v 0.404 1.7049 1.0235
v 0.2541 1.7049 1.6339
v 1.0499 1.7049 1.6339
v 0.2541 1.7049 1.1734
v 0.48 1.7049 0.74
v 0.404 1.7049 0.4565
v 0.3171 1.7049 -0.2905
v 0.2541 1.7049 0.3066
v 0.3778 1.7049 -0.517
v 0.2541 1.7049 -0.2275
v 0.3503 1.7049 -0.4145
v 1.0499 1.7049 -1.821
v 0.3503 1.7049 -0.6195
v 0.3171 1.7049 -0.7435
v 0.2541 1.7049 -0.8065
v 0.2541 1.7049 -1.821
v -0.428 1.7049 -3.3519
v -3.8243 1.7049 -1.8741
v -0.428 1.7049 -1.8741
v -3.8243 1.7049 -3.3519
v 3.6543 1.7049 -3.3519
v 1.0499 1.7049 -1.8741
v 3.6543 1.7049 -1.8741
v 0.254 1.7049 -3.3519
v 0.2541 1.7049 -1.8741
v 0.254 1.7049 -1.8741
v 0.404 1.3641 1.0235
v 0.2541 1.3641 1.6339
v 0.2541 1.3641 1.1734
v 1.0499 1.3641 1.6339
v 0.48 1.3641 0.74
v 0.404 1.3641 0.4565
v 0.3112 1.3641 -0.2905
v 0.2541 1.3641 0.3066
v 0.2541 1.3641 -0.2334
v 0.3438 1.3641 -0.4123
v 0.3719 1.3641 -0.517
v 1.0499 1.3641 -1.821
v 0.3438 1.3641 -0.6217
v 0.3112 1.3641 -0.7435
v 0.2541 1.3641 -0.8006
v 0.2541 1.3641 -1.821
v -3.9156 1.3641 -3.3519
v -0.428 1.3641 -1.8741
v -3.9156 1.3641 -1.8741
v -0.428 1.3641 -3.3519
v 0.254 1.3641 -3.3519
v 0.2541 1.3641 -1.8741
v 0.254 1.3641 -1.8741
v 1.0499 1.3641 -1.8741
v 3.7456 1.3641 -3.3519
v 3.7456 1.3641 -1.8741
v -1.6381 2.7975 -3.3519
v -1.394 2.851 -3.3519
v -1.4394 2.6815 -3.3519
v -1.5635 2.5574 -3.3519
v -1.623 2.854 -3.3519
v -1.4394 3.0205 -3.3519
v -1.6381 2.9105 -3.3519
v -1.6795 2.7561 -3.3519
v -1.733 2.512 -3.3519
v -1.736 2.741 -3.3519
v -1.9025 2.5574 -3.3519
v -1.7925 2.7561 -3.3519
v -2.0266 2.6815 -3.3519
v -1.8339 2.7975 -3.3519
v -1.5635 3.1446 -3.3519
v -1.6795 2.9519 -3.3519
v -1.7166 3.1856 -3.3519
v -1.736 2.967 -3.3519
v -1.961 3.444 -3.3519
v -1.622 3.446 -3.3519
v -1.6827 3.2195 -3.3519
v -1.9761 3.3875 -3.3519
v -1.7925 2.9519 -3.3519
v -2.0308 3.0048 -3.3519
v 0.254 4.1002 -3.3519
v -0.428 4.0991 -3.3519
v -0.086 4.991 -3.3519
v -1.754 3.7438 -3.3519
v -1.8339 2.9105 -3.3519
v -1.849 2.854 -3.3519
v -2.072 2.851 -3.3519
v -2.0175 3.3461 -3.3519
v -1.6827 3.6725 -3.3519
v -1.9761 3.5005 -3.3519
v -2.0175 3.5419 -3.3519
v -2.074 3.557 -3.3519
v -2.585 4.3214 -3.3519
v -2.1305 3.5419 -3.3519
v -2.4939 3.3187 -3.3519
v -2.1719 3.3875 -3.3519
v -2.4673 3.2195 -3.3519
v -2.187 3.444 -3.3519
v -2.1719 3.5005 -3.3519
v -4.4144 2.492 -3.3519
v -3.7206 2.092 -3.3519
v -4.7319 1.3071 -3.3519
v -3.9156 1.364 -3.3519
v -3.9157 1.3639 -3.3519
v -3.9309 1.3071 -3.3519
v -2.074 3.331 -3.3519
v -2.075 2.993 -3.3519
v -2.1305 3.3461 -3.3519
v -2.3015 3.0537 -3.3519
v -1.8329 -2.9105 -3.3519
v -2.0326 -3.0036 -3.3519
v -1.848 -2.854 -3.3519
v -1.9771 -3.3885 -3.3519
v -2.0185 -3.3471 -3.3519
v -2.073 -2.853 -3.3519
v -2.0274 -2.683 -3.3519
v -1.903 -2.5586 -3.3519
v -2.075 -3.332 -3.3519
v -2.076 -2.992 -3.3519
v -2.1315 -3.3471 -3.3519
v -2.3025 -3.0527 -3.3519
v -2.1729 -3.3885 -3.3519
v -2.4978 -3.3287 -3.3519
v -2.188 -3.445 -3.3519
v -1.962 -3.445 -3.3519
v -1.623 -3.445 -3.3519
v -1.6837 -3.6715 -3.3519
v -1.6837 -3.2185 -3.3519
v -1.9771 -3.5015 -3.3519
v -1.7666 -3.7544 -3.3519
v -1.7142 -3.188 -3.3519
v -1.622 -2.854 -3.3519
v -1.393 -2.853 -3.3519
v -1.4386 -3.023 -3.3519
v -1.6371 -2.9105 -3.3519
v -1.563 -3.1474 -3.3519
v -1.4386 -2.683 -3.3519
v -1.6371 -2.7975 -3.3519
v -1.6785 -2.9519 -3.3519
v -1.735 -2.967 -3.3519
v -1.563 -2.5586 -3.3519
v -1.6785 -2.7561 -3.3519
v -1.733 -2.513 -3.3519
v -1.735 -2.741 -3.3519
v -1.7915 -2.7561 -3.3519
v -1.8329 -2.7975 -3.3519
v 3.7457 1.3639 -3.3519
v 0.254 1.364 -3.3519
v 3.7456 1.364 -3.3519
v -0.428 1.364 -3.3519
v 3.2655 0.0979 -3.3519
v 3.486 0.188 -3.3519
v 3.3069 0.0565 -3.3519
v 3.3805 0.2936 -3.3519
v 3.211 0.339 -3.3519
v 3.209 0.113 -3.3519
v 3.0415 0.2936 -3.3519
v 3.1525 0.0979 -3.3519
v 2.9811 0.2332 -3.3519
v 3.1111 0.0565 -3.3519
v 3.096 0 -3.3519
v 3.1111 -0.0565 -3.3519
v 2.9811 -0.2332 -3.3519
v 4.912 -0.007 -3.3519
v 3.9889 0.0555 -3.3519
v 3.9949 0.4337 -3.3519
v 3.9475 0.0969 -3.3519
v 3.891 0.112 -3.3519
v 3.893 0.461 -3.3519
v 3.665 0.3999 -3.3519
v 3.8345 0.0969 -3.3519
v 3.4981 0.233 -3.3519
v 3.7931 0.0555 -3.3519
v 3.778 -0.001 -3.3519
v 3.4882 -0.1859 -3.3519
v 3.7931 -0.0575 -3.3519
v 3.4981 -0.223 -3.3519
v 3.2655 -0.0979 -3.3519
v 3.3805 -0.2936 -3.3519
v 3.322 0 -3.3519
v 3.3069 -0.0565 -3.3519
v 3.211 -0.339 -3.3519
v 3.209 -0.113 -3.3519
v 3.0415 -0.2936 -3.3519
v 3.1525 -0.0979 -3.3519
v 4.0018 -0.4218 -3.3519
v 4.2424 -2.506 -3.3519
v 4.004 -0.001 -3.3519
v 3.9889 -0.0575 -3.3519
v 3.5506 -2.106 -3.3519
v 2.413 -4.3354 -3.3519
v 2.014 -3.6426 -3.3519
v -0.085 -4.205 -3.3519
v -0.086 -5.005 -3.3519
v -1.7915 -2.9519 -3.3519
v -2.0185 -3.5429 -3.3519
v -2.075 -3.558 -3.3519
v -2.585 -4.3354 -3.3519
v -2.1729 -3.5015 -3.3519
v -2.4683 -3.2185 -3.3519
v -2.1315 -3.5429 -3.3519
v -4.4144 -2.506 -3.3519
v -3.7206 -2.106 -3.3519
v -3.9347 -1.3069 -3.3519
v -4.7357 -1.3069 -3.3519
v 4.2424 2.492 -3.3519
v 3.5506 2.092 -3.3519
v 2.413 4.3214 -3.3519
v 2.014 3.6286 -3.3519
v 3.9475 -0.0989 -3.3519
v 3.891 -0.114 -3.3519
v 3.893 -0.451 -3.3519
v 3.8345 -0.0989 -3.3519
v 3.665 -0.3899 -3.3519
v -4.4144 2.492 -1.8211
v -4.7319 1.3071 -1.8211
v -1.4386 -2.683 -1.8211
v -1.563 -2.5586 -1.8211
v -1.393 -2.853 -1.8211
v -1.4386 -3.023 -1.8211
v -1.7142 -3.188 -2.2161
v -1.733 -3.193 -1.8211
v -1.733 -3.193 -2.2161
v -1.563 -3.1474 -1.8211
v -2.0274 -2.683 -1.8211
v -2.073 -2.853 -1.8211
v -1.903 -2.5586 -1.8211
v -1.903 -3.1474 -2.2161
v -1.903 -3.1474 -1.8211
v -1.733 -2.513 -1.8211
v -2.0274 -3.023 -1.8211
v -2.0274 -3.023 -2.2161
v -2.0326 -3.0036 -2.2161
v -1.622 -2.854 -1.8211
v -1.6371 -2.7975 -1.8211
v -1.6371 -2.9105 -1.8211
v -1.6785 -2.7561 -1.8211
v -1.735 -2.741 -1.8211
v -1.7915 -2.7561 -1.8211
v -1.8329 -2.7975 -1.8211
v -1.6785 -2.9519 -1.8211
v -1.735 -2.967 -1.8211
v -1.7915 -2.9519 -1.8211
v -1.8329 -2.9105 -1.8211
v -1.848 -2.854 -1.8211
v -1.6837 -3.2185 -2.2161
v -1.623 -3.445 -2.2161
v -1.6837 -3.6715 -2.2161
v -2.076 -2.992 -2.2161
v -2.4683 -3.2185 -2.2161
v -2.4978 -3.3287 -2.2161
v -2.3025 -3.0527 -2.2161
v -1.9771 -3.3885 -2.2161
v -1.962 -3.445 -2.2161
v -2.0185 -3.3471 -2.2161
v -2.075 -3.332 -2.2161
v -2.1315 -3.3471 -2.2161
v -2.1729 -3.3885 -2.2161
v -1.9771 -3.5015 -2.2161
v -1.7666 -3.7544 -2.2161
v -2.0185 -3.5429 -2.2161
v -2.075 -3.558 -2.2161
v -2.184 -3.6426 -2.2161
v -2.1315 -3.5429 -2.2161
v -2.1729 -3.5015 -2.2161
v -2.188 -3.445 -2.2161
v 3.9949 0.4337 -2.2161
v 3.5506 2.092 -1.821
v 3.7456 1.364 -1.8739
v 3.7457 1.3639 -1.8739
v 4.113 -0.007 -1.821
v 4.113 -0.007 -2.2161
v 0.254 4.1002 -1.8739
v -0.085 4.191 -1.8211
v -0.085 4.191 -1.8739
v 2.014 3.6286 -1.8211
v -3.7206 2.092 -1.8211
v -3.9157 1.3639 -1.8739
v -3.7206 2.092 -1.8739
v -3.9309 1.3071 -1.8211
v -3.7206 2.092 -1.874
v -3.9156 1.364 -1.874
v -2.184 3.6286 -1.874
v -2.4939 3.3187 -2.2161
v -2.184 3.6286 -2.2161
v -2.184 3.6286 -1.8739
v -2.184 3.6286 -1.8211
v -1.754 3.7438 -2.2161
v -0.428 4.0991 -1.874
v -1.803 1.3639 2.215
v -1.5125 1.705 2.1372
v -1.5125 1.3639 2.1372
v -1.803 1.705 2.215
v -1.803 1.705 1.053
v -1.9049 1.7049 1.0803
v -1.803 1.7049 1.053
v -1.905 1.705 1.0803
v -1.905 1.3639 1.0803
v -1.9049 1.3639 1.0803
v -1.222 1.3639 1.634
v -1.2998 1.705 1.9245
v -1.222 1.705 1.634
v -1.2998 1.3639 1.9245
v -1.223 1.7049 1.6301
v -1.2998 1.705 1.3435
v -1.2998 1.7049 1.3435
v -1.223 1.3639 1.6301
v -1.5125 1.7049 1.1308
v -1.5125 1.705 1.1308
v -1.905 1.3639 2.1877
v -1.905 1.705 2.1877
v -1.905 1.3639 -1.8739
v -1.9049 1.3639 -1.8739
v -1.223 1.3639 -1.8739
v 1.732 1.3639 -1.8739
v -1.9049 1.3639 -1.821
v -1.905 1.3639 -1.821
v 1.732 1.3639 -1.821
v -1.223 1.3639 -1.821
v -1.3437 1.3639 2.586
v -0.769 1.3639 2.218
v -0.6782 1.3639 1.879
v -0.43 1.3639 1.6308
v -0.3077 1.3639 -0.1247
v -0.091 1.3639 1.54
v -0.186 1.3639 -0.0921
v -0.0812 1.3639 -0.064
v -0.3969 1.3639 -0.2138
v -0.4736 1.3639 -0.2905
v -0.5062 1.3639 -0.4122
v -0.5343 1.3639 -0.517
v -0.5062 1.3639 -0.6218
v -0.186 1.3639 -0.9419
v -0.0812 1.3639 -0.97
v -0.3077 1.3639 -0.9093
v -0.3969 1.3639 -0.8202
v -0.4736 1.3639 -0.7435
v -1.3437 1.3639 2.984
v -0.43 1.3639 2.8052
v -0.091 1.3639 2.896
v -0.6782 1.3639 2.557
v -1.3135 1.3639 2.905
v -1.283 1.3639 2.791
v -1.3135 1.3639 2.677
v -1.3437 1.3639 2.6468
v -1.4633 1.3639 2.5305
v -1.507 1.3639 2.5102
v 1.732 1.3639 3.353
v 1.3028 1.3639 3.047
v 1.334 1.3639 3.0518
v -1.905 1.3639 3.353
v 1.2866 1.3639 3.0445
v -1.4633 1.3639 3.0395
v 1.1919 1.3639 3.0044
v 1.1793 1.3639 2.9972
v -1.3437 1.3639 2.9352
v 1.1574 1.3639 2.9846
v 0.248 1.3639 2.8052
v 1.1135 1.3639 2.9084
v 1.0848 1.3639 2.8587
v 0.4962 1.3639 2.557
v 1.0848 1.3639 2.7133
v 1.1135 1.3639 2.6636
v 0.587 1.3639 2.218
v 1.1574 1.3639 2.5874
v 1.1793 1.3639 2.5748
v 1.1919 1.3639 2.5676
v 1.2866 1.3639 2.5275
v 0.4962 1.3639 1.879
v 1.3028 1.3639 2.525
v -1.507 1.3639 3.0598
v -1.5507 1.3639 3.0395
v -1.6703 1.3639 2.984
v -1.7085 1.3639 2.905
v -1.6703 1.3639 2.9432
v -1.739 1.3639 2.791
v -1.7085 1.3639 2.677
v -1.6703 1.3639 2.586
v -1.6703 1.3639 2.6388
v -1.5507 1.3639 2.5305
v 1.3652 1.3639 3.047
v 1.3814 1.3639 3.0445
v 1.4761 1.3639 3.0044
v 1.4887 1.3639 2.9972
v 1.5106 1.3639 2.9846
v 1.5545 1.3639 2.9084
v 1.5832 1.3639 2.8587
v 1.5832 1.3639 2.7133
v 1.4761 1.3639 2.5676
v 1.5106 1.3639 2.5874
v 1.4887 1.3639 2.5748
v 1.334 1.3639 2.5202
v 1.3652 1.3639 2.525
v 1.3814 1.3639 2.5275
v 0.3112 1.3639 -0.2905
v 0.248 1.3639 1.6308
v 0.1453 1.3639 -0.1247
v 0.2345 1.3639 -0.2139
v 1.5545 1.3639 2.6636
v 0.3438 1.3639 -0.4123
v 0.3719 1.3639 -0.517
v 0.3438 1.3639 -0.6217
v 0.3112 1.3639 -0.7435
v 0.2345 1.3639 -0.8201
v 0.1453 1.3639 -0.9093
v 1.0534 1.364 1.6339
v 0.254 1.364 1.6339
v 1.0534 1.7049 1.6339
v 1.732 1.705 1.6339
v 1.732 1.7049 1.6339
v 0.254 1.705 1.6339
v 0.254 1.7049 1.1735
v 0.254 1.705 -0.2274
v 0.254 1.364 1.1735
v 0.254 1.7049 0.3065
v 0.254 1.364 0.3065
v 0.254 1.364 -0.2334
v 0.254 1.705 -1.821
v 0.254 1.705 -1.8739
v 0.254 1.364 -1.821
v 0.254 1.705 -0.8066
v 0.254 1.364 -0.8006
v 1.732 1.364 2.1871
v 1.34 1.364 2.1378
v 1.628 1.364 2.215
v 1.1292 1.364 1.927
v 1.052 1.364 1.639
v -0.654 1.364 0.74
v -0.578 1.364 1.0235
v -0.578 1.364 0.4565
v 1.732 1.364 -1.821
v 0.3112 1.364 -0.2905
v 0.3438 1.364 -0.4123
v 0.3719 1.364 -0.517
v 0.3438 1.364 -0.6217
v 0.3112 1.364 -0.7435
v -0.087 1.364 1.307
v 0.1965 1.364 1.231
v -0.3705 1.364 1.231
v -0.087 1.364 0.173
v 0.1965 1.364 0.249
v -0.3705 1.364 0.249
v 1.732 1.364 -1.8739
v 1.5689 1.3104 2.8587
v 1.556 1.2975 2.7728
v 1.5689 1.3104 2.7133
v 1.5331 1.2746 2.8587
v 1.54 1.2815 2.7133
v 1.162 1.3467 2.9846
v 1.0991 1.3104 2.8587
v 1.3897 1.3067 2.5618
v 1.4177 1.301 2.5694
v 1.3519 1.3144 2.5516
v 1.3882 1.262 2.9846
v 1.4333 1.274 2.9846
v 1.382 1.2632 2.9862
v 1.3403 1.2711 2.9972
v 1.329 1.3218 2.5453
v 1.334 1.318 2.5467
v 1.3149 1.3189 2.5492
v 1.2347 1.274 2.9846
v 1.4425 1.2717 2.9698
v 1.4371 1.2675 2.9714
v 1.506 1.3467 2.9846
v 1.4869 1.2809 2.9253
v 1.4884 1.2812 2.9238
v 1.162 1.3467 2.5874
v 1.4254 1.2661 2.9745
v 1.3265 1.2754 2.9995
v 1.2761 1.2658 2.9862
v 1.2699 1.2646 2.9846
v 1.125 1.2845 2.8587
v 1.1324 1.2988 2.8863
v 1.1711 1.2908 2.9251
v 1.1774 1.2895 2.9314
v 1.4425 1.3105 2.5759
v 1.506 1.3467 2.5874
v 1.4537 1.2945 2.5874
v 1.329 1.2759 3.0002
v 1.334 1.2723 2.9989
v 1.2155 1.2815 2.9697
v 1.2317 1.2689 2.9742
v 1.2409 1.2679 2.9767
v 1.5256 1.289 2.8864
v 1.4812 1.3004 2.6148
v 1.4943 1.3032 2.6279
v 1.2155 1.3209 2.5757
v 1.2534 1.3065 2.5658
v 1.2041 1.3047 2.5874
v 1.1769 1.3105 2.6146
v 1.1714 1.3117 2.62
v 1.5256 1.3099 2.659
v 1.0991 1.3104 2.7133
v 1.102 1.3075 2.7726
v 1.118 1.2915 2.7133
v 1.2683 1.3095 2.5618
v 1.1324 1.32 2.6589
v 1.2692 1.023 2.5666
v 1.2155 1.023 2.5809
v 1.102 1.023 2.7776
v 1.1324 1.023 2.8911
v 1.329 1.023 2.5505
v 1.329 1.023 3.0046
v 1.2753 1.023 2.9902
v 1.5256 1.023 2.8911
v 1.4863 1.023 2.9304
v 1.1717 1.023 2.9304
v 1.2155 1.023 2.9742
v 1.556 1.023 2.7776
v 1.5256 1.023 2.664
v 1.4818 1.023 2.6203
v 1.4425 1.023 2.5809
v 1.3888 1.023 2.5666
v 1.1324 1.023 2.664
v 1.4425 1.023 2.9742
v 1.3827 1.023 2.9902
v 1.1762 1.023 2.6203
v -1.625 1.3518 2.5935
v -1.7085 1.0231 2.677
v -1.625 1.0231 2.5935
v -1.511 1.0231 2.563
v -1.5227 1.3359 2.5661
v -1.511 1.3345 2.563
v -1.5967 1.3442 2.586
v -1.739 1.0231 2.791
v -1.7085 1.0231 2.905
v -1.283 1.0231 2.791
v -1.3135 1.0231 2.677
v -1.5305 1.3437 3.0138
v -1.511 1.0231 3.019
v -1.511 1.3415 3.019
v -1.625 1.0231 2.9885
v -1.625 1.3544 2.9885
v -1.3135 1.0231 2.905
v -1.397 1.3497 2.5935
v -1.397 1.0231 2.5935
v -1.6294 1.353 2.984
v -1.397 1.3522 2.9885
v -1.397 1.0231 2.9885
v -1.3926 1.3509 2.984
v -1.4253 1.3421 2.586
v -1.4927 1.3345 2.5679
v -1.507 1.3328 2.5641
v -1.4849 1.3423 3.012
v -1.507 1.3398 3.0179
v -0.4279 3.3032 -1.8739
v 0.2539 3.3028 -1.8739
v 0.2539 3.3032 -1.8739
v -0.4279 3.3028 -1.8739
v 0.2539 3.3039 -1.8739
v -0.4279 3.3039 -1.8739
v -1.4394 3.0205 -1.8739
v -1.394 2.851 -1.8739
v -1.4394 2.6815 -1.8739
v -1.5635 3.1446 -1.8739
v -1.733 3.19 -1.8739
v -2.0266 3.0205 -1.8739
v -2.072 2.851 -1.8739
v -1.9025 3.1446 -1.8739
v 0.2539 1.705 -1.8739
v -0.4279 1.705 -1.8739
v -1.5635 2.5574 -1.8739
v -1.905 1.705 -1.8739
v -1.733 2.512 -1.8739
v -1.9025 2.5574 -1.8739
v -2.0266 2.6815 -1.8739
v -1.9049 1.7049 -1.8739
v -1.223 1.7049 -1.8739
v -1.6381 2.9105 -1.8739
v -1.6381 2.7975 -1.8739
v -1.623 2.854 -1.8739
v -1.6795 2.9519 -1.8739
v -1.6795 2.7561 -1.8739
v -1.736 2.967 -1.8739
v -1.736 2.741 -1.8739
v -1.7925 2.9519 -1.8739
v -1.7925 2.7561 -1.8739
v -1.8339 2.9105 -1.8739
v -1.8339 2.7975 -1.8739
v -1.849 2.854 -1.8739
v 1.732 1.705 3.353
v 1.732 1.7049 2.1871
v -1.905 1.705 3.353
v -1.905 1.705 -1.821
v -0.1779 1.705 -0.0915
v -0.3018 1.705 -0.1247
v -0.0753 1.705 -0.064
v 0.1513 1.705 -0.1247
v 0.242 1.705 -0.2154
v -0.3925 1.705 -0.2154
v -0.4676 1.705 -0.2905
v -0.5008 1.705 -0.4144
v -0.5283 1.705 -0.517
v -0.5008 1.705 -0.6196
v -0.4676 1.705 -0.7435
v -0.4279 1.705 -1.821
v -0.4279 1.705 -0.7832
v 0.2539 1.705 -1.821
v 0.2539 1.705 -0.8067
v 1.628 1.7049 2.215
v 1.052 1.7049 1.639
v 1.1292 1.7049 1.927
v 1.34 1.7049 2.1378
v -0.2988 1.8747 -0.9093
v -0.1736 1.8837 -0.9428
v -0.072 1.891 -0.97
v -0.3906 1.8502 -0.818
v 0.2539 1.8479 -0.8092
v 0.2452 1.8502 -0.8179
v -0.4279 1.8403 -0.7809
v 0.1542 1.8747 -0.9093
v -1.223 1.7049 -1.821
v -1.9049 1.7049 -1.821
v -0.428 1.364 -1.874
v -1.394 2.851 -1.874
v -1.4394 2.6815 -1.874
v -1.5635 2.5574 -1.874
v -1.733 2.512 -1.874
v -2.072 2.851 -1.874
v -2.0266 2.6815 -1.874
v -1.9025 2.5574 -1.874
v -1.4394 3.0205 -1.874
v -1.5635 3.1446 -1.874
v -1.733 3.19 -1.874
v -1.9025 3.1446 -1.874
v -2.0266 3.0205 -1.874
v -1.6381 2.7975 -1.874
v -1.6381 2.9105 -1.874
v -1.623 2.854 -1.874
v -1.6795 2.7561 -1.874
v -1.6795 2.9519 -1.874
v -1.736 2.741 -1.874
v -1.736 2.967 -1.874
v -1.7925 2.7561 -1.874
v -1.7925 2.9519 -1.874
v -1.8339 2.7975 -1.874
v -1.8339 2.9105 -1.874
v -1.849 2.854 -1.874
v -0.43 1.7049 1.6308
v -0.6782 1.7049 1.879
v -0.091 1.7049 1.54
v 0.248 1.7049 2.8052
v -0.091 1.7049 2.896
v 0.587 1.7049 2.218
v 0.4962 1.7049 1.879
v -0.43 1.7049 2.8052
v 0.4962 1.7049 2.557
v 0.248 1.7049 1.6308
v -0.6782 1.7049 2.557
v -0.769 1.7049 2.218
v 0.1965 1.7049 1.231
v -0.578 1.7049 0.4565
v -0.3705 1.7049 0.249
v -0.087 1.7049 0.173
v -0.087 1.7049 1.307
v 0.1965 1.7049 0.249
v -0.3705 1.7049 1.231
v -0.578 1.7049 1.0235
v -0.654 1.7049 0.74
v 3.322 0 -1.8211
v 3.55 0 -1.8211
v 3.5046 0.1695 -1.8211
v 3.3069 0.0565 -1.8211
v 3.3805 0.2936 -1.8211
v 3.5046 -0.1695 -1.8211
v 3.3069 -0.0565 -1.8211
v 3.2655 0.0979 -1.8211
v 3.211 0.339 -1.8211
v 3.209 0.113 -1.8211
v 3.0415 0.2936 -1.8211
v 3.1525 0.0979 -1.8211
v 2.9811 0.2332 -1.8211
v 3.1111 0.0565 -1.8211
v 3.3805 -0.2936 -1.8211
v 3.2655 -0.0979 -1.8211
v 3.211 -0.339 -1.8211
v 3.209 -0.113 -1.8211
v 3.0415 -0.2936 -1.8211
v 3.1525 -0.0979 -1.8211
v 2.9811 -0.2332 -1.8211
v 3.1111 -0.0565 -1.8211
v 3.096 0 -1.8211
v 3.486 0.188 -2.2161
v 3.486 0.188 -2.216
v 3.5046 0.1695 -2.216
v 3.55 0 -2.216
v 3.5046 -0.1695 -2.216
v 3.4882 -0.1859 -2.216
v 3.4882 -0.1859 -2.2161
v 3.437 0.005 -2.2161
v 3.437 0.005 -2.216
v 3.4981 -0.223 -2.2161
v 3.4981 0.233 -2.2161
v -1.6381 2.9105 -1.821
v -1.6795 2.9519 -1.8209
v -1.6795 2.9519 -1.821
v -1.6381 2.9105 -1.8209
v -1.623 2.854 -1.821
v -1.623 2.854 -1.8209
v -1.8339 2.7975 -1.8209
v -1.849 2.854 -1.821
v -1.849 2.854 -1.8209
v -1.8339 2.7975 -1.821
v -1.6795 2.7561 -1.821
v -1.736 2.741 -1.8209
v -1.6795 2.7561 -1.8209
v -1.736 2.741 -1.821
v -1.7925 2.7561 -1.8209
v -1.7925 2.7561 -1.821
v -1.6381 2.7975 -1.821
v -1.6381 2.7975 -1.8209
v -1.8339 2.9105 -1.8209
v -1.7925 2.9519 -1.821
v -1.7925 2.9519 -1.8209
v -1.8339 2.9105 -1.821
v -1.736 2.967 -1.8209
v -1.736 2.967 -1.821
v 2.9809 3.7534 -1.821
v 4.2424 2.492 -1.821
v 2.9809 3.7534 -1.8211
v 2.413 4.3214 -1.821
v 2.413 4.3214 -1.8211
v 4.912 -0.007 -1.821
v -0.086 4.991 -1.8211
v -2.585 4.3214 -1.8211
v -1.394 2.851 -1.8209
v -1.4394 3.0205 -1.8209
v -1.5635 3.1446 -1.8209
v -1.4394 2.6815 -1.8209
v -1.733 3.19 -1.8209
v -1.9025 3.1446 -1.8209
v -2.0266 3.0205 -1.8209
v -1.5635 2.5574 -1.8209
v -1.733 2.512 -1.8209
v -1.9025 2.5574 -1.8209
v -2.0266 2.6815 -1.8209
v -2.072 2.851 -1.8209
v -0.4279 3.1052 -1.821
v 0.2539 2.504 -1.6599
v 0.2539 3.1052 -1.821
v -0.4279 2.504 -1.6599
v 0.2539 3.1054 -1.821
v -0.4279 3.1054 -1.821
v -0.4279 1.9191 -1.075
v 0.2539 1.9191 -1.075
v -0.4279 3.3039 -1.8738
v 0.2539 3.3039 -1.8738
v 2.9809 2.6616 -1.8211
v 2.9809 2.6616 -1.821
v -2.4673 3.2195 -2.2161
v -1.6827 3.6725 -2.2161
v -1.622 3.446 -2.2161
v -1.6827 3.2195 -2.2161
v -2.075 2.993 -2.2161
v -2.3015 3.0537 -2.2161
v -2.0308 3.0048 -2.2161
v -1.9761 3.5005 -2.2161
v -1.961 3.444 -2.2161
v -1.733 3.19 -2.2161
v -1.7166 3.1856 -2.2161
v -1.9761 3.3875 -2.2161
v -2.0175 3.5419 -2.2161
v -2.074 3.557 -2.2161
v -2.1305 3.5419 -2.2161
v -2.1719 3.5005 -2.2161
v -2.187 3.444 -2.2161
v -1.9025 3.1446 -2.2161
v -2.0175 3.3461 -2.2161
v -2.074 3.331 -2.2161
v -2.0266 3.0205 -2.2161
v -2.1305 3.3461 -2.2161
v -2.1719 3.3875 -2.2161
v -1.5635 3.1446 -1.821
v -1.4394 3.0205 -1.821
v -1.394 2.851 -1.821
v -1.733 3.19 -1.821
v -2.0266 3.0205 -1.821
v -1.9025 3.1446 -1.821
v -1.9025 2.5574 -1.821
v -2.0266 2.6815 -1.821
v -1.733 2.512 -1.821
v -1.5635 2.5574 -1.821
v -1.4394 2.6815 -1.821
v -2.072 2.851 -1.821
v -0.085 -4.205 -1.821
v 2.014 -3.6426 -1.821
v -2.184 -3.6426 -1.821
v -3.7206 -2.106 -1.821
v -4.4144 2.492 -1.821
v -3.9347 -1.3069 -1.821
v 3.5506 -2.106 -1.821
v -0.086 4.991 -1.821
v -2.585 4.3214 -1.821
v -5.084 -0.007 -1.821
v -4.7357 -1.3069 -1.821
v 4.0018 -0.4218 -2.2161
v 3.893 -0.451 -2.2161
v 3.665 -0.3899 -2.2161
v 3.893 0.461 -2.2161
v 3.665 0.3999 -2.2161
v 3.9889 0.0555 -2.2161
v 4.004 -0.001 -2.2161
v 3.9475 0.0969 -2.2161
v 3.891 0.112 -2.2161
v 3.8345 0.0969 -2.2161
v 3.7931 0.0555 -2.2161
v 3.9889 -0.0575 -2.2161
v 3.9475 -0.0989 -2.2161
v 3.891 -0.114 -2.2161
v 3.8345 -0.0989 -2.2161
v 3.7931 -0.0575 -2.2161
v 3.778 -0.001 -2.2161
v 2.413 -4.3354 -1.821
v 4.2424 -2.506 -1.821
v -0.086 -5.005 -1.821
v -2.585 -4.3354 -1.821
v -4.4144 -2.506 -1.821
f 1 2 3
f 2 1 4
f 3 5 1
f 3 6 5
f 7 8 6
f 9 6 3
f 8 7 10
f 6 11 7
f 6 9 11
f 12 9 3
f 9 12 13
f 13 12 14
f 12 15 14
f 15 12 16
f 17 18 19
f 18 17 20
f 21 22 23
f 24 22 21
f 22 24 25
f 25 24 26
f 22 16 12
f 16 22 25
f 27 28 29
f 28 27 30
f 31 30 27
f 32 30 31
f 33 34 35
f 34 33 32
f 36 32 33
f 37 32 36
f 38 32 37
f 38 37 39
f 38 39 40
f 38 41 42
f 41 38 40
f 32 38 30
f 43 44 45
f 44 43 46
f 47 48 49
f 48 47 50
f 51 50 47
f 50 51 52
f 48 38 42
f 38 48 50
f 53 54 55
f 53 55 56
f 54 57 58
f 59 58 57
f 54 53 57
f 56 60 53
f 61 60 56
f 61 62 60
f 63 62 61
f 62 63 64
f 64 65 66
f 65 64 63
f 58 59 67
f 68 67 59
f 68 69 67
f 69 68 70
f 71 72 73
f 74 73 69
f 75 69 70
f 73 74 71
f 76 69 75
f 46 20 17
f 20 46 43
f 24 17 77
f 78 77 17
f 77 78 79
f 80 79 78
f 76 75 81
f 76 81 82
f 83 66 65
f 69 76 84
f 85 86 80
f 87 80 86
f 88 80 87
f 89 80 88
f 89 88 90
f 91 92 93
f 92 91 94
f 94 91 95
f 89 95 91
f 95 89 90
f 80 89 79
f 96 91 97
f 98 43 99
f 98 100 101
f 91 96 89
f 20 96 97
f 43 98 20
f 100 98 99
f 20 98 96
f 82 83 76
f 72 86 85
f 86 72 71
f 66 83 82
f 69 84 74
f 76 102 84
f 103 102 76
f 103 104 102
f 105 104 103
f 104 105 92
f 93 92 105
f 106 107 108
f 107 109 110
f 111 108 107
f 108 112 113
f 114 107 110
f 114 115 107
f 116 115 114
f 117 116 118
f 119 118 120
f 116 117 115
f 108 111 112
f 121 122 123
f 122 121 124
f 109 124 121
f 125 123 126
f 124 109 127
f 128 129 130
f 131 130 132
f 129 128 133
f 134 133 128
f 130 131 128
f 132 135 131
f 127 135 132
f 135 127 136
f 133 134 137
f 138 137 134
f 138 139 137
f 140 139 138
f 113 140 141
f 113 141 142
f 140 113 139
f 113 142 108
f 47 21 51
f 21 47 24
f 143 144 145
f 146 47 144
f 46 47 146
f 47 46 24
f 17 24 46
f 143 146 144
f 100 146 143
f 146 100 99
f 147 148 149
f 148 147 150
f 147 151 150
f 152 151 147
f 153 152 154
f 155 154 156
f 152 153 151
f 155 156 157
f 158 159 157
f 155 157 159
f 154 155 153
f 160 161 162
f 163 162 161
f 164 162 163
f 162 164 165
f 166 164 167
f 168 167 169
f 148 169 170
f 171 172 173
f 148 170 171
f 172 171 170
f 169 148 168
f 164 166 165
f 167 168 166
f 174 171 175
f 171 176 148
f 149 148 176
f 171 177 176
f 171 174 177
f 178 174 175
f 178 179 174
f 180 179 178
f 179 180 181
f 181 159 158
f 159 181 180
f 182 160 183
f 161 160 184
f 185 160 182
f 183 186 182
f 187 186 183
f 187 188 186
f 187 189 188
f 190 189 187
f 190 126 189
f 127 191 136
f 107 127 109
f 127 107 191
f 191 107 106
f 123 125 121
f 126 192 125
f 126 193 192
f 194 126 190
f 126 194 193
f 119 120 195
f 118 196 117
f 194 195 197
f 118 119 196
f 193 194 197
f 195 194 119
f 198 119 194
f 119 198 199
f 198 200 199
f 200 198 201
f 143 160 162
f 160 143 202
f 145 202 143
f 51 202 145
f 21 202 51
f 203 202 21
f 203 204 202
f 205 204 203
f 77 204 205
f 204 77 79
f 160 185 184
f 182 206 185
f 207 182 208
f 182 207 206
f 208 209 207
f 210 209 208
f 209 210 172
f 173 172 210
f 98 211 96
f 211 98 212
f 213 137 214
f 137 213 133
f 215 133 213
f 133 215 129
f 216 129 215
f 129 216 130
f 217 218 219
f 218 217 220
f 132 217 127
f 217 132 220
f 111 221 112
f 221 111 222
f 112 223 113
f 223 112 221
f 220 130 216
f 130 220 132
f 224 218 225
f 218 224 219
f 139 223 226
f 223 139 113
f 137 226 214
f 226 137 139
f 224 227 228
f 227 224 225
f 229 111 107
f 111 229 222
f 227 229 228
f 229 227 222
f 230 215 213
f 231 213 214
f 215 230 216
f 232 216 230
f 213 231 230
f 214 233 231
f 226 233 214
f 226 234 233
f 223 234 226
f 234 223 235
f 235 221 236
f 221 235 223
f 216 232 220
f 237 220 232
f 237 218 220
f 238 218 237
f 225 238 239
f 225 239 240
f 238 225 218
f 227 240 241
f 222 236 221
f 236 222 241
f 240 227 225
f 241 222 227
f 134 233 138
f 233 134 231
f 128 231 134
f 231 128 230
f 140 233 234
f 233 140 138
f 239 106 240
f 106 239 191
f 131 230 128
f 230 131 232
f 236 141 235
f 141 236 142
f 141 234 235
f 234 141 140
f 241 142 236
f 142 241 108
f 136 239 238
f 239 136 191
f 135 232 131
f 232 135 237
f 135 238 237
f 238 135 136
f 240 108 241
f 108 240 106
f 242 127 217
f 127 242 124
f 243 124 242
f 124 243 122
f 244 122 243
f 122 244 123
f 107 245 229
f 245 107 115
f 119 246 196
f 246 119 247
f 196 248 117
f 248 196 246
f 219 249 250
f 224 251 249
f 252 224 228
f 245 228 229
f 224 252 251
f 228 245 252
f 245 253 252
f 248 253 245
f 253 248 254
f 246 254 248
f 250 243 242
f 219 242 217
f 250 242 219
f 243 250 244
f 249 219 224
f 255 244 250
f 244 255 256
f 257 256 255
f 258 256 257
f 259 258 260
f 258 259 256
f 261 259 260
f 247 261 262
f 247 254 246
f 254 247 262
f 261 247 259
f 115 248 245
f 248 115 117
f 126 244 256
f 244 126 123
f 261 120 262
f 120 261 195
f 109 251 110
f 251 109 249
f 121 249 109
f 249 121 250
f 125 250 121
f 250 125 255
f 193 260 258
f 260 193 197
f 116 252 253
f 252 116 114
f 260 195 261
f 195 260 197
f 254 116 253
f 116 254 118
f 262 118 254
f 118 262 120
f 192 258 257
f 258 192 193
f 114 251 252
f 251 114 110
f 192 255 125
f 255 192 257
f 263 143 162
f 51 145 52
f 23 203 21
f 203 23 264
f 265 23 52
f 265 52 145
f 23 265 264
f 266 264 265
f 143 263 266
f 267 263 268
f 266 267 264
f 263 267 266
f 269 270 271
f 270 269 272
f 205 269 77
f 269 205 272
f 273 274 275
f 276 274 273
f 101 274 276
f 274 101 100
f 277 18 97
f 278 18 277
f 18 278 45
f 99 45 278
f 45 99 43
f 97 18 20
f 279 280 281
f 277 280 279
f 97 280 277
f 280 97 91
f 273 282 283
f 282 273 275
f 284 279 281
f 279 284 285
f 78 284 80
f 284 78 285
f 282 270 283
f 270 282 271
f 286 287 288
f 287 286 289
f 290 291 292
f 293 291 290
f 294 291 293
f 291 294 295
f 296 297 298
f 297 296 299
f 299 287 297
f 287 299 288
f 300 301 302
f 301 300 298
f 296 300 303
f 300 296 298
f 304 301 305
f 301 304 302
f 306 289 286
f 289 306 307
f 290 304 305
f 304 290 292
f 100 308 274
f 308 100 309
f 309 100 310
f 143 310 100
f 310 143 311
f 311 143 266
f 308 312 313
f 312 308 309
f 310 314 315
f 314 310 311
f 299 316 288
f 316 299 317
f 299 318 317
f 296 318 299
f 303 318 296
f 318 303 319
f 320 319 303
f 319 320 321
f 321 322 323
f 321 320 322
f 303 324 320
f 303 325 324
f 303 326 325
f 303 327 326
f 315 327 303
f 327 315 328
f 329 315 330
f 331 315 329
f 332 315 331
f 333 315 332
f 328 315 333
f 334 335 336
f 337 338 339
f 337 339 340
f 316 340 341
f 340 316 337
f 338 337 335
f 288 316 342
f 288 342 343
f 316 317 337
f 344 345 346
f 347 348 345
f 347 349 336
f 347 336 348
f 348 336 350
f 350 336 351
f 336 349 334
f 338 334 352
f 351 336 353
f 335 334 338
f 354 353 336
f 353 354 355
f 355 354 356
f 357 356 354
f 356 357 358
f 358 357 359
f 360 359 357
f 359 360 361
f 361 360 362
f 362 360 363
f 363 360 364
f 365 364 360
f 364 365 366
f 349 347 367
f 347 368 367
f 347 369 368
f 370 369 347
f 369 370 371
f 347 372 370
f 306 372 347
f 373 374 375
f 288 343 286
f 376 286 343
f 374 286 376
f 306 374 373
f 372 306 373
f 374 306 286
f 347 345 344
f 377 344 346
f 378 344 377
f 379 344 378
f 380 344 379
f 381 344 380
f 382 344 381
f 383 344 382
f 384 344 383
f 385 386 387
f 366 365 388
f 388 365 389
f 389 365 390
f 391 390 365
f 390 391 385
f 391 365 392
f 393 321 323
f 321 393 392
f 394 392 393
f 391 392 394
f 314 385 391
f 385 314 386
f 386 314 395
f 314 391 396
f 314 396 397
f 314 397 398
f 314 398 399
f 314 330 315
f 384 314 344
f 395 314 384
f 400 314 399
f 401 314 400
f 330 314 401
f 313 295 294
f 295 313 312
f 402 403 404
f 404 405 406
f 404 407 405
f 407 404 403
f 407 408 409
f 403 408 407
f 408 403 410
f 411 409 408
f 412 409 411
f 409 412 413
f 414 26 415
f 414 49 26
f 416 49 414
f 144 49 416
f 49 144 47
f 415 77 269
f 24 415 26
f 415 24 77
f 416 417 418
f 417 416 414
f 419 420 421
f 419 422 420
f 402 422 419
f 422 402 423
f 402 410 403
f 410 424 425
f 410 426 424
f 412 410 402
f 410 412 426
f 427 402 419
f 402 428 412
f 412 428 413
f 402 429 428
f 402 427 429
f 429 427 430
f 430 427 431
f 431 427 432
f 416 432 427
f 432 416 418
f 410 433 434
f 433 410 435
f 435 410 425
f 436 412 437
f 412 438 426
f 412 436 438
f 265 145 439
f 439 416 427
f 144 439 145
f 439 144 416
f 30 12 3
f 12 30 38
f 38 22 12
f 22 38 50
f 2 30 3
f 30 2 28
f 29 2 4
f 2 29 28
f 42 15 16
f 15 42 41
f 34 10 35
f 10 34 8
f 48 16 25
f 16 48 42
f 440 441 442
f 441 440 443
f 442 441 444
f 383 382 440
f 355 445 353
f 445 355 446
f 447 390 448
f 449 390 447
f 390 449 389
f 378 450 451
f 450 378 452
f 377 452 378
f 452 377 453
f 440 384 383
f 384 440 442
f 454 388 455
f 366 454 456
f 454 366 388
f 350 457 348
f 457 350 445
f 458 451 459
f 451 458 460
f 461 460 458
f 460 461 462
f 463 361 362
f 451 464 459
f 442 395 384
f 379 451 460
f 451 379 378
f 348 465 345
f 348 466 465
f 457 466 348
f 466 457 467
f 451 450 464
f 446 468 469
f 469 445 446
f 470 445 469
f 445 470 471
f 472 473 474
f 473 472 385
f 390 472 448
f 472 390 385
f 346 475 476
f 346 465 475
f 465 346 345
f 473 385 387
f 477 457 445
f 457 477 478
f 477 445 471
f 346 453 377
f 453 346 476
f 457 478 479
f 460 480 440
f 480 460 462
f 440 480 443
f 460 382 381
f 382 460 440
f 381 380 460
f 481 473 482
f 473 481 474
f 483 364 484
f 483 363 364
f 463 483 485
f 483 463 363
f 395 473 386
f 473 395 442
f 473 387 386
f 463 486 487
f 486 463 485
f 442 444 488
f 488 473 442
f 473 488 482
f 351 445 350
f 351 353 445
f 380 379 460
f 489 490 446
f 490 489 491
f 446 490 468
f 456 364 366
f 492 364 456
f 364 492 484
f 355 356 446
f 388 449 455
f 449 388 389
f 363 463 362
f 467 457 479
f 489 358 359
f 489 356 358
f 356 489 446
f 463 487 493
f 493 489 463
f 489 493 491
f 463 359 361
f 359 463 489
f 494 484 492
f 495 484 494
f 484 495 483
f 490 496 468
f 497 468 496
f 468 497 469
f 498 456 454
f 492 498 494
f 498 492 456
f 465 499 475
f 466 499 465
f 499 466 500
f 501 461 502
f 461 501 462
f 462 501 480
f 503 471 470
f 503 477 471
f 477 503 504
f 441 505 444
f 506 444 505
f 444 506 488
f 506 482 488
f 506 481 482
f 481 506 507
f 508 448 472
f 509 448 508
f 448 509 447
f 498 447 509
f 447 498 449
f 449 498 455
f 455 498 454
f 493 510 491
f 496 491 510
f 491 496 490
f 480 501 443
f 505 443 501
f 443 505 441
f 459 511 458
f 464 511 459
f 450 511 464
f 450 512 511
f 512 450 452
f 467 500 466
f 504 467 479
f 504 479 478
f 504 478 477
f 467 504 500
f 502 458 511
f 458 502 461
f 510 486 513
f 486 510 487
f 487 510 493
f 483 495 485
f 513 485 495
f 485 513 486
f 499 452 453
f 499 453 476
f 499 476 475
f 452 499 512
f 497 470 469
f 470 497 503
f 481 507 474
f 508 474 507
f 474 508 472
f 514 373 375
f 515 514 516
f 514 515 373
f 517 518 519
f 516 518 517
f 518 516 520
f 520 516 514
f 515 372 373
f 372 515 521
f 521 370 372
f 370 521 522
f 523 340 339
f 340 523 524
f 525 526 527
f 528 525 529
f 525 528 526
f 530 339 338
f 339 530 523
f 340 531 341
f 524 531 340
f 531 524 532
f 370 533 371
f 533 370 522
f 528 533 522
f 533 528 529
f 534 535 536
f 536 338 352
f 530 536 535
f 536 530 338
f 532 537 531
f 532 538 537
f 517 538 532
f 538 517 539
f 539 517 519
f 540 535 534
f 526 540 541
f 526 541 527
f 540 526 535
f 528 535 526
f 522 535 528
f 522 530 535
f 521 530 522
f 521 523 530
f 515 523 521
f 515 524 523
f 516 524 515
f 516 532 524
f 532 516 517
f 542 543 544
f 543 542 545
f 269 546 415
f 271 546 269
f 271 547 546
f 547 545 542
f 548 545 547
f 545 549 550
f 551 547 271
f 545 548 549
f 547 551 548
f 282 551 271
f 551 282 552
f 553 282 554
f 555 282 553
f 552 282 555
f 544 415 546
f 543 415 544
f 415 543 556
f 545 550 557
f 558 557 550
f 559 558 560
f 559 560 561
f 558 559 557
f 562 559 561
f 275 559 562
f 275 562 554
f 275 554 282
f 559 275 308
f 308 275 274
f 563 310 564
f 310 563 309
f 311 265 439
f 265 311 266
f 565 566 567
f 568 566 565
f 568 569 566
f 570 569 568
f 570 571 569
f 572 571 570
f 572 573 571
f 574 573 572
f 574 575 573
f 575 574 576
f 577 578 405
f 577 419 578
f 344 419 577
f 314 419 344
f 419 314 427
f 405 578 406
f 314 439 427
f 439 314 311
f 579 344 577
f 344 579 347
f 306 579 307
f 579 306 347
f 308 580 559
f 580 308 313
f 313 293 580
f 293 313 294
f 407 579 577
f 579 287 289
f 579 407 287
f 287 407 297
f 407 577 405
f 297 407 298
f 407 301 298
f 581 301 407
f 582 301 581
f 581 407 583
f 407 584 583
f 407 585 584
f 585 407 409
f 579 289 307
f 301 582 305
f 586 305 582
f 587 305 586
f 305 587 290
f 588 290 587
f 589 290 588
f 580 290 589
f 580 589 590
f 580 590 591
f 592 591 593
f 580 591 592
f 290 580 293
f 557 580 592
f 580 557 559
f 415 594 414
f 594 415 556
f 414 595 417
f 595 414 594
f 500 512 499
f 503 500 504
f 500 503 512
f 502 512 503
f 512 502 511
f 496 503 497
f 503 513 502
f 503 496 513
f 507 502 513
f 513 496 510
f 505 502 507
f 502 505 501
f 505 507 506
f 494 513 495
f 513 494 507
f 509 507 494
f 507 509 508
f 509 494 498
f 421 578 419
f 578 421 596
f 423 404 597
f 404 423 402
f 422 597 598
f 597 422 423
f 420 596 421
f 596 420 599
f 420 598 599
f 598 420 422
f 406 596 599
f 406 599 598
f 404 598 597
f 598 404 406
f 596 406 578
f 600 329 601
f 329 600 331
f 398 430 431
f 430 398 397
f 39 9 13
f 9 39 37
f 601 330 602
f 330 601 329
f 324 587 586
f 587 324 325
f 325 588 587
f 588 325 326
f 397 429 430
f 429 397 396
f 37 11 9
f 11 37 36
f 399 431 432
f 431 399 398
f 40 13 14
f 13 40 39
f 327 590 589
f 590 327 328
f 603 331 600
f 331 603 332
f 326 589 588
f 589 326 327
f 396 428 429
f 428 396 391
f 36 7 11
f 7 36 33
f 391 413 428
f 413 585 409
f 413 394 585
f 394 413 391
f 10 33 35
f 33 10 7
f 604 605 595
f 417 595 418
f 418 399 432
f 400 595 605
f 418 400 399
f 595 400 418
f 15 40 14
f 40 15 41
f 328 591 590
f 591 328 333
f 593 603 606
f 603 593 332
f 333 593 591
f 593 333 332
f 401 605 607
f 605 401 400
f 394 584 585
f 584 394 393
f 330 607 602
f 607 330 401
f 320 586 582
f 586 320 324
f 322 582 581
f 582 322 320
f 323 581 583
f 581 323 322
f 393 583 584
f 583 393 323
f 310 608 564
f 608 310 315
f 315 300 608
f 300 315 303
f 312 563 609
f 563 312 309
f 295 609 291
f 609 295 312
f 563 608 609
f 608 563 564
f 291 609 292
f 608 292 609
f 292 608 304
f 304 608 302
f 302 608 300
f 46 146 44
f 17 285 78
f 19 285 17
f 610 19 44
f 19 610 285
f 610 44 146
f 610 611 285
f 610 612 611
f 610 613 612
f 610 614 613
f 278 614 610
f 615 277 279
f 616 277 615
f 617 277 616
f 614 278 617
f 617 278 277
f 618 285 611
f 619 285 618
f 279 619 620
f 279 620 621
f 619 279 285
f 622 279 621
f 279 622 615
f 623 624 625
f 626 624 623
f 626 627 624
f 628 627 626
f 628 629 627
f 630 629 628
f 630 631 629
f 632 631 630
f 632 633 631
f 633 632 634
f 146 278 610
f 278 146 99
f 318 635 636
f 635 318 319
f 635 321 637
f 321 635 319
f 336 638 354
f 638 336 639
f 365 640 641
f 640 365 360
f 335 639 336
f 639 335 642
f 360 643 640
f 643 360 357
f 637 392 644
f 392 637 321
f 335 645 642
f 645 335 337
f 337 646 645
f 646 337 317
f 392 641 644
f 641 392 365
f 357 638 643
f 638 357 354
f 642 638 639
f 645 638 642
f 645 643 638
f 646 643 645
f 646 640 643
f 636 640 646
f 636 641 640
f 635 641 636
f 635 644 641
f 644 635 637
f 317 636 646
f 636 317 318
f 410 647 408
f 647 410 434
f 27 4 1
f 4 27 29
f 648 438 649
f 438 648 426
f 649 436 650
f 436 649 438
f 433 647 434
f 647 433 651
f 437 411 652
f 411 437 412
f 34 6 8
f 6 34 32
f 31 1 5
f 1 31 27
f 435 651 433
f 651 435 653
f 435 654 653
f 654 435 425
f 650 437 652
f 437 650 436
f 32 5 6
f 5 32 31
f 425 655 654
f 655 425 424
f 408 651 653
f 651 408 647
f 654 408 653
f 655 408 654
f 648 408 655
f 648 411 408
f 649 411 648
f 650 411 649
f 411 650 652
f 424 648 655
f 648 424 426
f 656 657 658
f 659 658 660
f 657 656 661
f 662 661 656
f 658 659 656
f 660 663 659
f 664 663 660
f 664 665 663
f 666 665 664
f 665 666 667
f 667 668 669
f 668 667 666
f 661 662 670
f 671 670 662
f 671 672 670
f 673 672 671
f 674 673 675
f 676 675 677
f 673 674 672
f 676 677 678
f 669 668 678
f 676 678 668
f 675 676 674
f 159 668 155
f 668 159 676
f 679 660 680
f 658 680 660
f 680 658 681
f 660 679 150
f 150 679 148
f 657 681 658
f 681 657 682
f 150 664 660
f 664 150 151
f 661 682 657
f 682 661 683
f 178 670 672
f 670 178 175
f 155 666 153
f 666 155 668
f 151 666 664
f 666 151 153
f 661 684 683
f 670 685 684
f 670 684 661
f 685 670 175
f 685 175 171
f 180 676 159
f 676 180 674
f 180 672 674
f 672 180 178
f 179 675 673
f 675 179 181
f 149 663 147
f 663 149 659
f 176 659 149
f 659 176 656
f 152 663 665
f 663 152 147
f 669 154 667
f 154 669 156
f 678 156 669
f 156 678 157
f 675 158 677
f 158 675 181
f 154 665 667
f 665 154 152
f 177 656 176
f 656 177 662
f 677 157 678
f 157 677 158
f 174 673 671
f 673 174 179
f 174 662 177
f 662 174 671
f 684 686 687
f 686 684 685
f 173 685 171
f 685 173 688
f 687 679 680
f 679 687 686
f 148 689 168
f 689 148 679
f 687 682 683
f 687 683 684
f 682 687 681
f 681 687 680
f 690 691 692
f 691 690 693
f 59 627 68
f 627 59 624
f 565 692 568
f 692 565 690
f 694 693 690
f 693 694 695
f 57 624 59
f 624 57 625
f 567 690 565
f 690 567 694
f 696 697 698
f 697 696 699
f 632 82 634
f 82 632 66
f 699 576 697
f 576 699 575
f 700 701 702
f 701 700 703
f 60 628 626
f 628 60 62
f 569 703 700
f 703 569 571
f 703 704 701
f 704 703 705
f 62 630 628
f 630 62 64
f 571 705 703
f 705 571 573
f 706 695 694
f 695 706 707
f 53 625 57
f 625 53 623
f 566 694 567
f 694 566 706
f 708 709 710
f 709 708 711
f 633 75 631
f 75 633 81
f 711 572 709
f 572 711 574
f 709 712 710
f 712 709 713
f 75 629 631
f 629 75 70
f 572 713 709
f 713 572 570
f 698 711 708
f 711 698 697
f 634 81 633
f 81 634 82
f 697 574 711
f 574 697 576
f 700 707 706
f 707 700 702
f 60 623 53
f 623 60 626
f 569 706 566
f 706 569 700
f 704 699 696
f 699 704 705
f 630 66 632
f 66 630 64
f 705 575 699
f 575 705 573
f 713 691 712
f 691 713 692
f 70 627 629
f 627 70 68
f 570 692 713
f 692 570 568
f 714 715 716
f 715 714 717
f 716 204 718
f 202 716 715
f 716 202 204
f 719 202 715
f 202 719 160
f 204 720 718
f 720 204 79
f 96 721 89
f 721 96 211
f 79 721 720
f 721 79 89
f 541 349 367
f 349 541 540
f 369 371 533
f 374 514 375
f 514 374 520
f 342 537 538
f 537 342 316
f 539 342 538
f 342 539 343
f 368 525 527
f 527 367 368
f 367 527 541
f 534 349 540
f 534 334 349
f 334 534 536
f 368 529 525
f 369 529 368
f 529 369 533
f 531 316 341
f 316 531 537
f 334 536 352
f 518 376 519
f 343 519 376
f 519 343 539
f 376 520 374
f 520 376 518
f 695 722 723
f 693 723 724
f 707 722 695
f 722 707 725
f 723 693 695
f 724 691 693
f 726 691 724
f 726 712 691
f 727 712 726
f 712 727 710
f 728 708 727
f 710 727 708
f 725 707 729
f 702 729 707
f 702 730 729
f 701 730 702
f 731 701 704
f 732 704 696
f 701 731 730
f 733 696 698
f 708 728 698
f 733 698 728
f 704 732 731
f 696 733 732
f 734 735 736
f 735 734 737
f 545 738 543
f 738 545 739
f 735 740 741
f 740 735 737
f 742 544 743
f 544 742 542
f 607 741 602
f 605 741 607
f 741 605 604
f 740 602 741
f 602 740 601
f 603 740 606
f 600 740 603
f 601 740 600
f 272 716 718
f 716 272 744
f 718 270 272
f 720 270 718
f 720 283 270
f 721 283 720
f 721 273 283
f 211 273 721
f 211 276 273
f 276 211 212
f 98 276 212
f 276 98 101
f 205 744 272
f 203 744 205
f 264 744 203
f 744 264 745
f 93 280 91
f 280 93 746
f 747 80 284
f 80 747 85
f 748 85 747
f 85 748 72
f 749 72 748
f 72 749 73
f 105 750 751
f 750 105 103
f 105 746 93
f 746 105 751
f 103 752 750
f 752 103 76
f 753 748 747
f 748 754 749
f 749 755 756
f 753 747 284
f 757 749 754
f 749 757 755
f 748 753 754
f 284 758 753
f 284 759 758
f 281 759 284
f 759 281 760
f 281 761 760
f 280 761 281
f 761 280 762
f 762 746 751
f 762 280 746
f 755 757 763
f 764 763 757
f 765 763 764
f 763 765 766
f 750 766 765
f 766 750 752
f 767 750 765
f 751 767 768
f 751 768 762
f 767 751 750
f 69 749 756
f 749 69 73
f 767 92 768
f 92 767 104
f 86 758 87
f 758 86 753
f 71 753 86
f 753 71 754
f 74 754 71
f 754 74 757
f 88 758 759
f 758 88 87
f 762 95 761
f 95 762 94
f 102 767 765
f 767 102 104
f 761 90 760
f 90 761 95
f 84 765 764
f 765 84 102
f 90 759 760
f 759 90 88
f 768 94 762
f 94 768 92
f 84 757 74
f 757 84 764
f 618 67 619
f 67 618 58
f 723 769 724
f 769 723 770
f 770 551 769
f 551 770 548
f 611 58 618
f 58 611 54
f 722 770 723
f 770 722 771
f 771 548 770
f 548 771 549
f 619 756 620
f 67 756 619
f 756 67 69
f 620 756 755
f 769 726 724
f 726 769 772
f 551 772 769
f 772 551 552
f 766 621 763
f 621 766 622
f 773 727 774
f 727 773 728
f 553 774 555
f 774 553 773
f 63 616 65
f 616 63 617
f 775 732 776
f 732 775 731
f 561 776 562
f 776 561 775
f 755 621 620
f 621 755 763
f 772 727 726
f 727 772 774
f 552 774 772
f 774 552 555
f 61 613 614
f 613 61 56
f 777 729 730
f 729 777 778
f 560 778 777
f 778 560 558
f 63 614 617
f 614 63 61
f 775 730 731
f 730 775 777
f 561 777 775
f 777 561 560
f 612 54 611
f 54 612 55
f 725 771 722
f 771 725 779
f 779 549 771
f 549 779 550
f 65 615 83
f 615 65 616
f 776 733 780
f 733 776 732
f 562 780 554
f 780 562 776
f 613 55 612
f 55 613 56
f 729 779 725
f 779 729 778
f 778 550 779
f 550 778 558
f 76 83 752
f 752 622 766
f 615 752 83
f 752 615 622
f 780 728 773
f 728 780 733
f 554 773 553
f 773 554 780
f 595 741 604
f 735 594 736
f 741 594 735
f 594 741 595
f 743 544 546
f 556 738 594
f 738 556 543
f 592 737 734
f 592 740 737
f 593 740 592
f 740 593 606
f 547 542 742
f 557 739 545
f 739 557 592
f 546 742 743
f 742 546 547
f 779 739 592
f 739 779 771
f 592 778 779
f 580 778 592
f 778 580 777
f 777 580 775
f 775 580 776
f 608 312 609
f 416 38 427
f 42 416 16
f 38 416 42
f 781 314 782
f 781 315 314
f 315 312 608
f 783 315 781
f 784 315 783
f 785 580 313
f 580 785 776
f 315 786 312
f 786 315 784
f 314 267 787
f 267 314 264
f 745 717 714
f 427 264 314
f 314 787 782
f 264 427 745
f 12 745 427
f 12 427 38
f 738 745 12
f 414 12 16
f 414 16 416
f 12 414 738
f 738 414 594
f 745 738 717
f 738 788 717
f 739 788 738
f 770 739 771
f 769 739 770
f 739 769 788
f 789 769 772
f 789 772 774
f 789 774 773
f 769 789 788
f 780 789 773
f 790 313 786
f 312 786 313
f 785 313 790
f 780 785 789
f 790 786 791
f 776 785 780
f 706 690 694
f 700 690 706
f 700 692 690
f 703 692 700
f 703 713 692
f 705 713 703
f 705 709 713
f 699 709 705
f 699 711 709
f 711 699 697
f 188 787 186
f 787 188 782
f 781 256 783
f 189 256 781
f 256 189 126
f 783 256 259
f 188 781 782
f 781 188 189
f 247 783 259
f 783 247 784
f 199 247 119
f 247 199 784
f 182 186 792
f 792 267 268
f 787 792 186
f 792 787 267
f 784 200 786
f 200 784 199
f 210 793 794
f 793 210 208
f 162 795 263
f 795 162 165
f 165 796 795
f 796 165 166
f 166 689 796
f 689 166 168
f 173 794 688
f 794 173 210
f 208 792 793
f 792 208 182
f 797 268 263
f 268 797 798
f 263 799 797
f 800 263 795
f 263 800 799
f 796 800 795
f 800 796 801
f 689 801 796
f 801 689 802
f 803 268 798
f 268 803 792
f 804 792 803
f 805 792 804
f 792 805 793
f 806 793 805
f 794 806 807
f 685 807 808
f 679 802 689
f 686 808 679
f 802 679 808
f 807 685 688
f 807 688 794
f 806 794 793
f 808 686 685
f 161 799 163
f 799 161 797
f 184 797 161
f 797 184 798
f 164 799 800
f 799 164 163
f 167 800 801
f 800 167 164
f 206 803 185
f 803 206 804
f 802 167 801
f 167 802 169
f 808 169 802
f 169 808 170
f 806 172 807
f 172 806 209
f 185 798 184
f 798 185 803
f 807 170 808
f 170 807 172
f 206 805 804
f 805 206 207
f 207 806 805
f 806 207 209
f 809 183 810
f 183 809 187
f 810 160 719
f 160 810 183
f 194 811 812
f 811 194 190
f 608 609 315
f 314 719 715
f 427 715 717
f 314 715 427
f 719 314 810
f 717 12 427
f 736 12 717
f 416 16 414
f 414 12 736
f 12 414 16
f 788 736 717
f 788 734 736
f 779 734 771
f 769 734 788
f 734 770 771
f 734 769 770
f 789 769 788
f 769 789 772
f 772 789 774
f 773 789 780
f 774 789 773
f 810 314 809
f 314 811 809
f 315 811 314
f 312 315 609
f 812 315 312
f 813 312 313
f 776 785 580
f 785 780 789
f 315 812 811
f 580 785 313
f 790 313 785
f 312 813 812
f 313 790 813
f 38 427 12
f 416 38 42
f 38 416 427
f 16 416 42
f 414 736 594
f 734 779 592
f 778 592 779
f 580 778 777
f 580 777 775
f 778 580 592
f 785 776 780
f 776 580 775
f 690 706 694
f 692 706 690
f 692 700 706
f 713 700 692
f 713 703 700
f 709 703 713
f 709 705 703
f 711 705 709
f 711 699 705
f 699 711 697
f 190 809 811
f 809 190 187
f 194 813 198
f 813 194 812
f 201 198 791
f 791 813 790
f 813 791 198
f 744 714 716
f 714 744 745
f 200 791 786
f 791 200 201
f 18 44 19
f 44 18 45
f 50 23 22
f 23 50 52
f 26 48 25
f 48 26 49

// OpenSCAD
intersection() {
  cube(size = [11.7918, 11.9998, 8.0458], center = true);

  union() {
    intersection() {
      translate([-0.086, -0.007, 7.374])
      cylinder(h = 21.4518, r1 = 4.998, r2 = 4.998, center = true, $fn = 12);
    
      union() {
        translate([-2.076, -3.445, -10.726])
        cylinder(h = 14.7478, r1 = 0.453, r2 = 0.453, center = true, $fn = 12);
      
        translate([-7.5595, 1.5345, -10.158])
        cube(size = [21.0808, 0.3408, 15.8838], center = true);
      }
    }
  
    difference() {
      intersection() {
        translate([0, -9.7035, -9.9605])
        cube(size = [36.1998, 16.7928, 16.2788], center = true);
      
        union() {
          translate([3.893, 0.005, -2.784])
          cylinder(h = 1.1358, r1 = 0.456, r2 = 0.456, center = true, $fn = 12);
        
          translate([-1.733, -2.853, 7.374])
          cylinder(h = 21.4518, r1 = 0.34, r2 = 0.34, center = true, $fn = 12);
        }
      }
    
      translate([-1.735, -2.854, -2.5865])
      cylinder(h = 1.5309, r1 = 0.113, r2 = 0.113, center = true, $fn = 12);
    }
  
    difference() {
      translate([-2.076, -3.445, -2.784])
      cylinder(h = 1.1358, r1 = 0.453, r2 = 0.453, center = true, $fn = 12);
    
      translate([-2.075, -3.445, 0])
      cylinder(h = 36.1999, r1 = 0.113, r2 = 0.113, center = true, $fn = 12);
    }
  
    difference() {
      difference() {
        translate([-7.5595, 9.9025, -2.0185])
        cube(size = [21.0808, 16.3948, 0.3948], center = true);
      
        translate([3.209, 0, 7.374])
        cylinder(h = 21.4519, r1 = 0.113, r2 = 0.113, center = true, $fn = 12);
      }
    
      union() {
        translate([-0.086, -0.007, -2.045])
        cylinder(h = 0.3419, r1 = 4.998, r2 = 4.998, center = true, $fn = 12);
      
        translate([-7.5595, 8.3965, 7.374])
        cube(size = [21.0809, 19.4069, 21.4519], center = true);
      }
    }
  
    difference() {
      union() {
        difference() {
          difference() {
            translate([-0.085, -0.007, 7.374])
            rotate([180, 0, 180])
            cylinder(h = 21.4518, r1 = 4.198, r2 = 4.198, center = true, $fn = 12);
          
            translate([-1.803, 0, 1.634])
            rotate([180, 90, -90])
            cylinder(h = 36.1999, r1 = 0.581, r2 = 0.581, center = true, $fn = 12);
          }
        
          union() {
            translate([0, -8.368, 0])
            cube(size = [36.1999, 19.4639, 36.1999], center = true);
          
            translate([9.177, 9.732, -0.859])
            cube(size = [17.8459, 16.7359, 4.9859], center = true);
          }
        }
      
        translate([0.652, 1.5345, -0.859])
        cube(size = [0.7958, 0.3408, 4.9858], center = true);
      
        translate([1.334, 1.446, 2.786])
        sphere(r = 0.2808, $fn = 12);
      
        translate([1.329, 0.0487795, 2.79457])
        rotate([-180, 89, -90])
        cylinder(h = 36.1998, r1 = 0.227, r2 = 0.227, center = true, $fn = 12);
      
        translate([-1.511, 9.5615, 2.791])
        rotate([180, 90, -90])
        cylinder(h = 17.0768, r1 = 0.228, r2 = 0.228, center = true, $fn = 12);
      }
    
      union() {
        difference() {
          translate([0, 0, 8.113])
          cube(size = [36.1999, 36.1999, 19.9739], center = true);
        
          translate([-0.0865, 1.364, 0.0005])
          cube(size = [3.637, 0.682, 6.705], center = true);
        }
      
        translate([1.628, 1.5345, 1.639])
        rotate([180, 90, -90])
        cylinder(h = 0.3409, r1 = 0.576, r2 = 0.576, center = true, $fn = 12);
      
        translate([-0.104984, 0.0018325, -0.517])
        rotate([-25.5651, 90, 63.4349])
        cylinder(h = 36.1999, r1 = 0.453, r2 = 0.453, center = true, $fn = 12);
      
        translate([-1.564, -8.1975, -0.12])
        cube(size = [0.6819, 19.8049, 3.5079], center = true);
      
        translate([-9.264, 9.732, -2.613])
        cube(size = [17.6719, 16.7359, 1.4779], center = true);
      
        translate([-0.091, -8.1975, 2.218])
        rotate([180, 90, -90])
        cylinder(h = 19.8049, r1 = 0.678, r2 = 0.678, center = true, $fn = 12);
      
        translate([-0.087, 1.5345, 0.74])
        rotate([180, 90, -90])
        cylinder(h = 0.3409, r1 = 0.567, r2 = 0.567, center = true, $fn = 12);
      }
    }
  
    difference() {
      intersection() {
        translate([10.54, 0, -2.5865])
        cube(size = [15.1178, 36.1998, 1.5308], center = true);
      
        translate([3.211, 0, 0])
        cylinder(h = 36.1998, r1 = 0.339, r2 = 0.339, center = true, $fn = 12);
      }
    
      union() {
        translate([3.209, 0, 7.374])
        cylinder(h = 21.4519, r1 = 0.113, r2 = 0.113, center = true, $fn = 12);
      
        translate([3.893, 0.005, -2.784])
        cylinder(h = 1.1359, r1 = 0.456, r2 = 0.456, center = true, $fn = 12);
      }
    }
  
    intersection() {
      difference() {
        difference() {
          translate([-0.086, -0.007, -7.374])
          cylinder(h = 21.4518, r1 = 4.998, r2 = 4.998, center = true, $fn = 12);
        
          union() {
            translate([-1.736, 2.854, 0])
            cylinder(h = 36.1999, r1 = 0.113, r2 = 0.113, center = true, $fn = 12);
          
            translate([-0.104984, 0.0018325, -0.517])
            rotate([-25.5651, 90, 63.4349])
            cylinder(h = 36.1999, r1 = 0.453, r2 = 0.453, center = true, $fn = 12);
          }
        }
      
        union() {
          difference() {
            translate([8.0975, 9.7035, 2.4935])
            cube(size = [20.0049, 16.7929, 1.7189], center = true);
          
            translate([-1.507, 2.063, 2.785])
            sphere(r = 0.769, $fn = 12);
          }
        
          translate([-9.264, 9.732, 0.766])
          cube(size = [17.6719, 16.7359, 5.1739], center = true);
        
          translate([0.2545, 3.303, -0.276])
          rotate([180, 90, 180])
          cylinder(h = 2.9549, r1 = 1.598, r2 = 1.598, center = true, $fn = 12);
        }
      }
    
      union() {
        difference() {
          translate([0, 9.7035, -2.5865])
          cube(size = [36.1998, 16.7928, 1.5308], center = true);
        
          translate([-0.085, -0.007, 0])
          rotate([180, 0, 180])
          cylinder(h = 36.1999, r1 = 4.198, r2 = 4.198, center = true, $fn = 12);
        }
      
        difference() {
          union() {
            translate([-0.0865, 9.7035, 2.4935])
            cube(size = [3.6368, 16.7928, 1.7188], center = true);
          
            translate([-2.075, 3.446, -2.784])
            cylinder(h = 1.1358, r1 = 0.453, r2 = 0.453, center = true, $fn = 12);
          }
        
          translate([-2.074, 3.444, 0])
          cylinder(h = 36.1999, r1 = 0.113, r2 = 0.113, center = true, $fn = 12);
        }
      
        translate([-1.733, 2.851, -1.934])
        cylinder(h = 2.8358, r1 = 0.339, r2 = 0.339, center = true, $fn = 12);
      
        translate([-0.087, 2.334, -1.3665])
        cube(size = [0.6818, 1.9398, 1.6988], center = true);
      }
    }
  
    difference() {
      union() {
        difference() {
          translate([0, 0, 7.374])
          cube(size = [36.1998, 36.1998, 21.4518], center = true);
        
          translate([-0.085, -0.007, -9.9605])
          rotate([180, 0, 180])
          cylinder(h = 16.2789, r1 = 4.198, r2 = 4.198, center = true, $fn = 12);
        }
      
        difference() {
          translate([3.893, 0.005, -2.784])
          cylinder(h = 1.1358, r1 = 0.456, r2 = 0.456, center = true, $fn = 12);
        
          translate([3.891, -0.001, 0])
          cylinder(h = 36.1999, r1 = 0.113, r2 = 0.113, center = true, $fn = 12);
        }
      }
    
      union() {
        translate([-7.5595, 8.3965, -2.5865])
        cube(size = [21.0809, 19.4069, 1.5309], center = true);
      
        difference() {
          translate([0, 0, 7.374])
          cube(size = [36.1999, 36.1999, 21.4519], center = true);
        
          translate([-0.086, -0.007, -9.9605])
          cylinder(h = 16.279, r1 = 4.998, r2 = 4.998, center = true, $fn = 12);
        }
      }
    }
  
    intersection() {
      translate([-0.085, -0.007, -9.9605])
      rotate([180, 0, 180])
      cylinder(h = 16.2788, r1 = 4.198, r2 = 4.198, center = true, $fn = 12);
    
      translate([0, 1.5345, -2.613])
      cube(size = [36.1998, 0.3408, 1.4778], center = true);
    }
  }
}
